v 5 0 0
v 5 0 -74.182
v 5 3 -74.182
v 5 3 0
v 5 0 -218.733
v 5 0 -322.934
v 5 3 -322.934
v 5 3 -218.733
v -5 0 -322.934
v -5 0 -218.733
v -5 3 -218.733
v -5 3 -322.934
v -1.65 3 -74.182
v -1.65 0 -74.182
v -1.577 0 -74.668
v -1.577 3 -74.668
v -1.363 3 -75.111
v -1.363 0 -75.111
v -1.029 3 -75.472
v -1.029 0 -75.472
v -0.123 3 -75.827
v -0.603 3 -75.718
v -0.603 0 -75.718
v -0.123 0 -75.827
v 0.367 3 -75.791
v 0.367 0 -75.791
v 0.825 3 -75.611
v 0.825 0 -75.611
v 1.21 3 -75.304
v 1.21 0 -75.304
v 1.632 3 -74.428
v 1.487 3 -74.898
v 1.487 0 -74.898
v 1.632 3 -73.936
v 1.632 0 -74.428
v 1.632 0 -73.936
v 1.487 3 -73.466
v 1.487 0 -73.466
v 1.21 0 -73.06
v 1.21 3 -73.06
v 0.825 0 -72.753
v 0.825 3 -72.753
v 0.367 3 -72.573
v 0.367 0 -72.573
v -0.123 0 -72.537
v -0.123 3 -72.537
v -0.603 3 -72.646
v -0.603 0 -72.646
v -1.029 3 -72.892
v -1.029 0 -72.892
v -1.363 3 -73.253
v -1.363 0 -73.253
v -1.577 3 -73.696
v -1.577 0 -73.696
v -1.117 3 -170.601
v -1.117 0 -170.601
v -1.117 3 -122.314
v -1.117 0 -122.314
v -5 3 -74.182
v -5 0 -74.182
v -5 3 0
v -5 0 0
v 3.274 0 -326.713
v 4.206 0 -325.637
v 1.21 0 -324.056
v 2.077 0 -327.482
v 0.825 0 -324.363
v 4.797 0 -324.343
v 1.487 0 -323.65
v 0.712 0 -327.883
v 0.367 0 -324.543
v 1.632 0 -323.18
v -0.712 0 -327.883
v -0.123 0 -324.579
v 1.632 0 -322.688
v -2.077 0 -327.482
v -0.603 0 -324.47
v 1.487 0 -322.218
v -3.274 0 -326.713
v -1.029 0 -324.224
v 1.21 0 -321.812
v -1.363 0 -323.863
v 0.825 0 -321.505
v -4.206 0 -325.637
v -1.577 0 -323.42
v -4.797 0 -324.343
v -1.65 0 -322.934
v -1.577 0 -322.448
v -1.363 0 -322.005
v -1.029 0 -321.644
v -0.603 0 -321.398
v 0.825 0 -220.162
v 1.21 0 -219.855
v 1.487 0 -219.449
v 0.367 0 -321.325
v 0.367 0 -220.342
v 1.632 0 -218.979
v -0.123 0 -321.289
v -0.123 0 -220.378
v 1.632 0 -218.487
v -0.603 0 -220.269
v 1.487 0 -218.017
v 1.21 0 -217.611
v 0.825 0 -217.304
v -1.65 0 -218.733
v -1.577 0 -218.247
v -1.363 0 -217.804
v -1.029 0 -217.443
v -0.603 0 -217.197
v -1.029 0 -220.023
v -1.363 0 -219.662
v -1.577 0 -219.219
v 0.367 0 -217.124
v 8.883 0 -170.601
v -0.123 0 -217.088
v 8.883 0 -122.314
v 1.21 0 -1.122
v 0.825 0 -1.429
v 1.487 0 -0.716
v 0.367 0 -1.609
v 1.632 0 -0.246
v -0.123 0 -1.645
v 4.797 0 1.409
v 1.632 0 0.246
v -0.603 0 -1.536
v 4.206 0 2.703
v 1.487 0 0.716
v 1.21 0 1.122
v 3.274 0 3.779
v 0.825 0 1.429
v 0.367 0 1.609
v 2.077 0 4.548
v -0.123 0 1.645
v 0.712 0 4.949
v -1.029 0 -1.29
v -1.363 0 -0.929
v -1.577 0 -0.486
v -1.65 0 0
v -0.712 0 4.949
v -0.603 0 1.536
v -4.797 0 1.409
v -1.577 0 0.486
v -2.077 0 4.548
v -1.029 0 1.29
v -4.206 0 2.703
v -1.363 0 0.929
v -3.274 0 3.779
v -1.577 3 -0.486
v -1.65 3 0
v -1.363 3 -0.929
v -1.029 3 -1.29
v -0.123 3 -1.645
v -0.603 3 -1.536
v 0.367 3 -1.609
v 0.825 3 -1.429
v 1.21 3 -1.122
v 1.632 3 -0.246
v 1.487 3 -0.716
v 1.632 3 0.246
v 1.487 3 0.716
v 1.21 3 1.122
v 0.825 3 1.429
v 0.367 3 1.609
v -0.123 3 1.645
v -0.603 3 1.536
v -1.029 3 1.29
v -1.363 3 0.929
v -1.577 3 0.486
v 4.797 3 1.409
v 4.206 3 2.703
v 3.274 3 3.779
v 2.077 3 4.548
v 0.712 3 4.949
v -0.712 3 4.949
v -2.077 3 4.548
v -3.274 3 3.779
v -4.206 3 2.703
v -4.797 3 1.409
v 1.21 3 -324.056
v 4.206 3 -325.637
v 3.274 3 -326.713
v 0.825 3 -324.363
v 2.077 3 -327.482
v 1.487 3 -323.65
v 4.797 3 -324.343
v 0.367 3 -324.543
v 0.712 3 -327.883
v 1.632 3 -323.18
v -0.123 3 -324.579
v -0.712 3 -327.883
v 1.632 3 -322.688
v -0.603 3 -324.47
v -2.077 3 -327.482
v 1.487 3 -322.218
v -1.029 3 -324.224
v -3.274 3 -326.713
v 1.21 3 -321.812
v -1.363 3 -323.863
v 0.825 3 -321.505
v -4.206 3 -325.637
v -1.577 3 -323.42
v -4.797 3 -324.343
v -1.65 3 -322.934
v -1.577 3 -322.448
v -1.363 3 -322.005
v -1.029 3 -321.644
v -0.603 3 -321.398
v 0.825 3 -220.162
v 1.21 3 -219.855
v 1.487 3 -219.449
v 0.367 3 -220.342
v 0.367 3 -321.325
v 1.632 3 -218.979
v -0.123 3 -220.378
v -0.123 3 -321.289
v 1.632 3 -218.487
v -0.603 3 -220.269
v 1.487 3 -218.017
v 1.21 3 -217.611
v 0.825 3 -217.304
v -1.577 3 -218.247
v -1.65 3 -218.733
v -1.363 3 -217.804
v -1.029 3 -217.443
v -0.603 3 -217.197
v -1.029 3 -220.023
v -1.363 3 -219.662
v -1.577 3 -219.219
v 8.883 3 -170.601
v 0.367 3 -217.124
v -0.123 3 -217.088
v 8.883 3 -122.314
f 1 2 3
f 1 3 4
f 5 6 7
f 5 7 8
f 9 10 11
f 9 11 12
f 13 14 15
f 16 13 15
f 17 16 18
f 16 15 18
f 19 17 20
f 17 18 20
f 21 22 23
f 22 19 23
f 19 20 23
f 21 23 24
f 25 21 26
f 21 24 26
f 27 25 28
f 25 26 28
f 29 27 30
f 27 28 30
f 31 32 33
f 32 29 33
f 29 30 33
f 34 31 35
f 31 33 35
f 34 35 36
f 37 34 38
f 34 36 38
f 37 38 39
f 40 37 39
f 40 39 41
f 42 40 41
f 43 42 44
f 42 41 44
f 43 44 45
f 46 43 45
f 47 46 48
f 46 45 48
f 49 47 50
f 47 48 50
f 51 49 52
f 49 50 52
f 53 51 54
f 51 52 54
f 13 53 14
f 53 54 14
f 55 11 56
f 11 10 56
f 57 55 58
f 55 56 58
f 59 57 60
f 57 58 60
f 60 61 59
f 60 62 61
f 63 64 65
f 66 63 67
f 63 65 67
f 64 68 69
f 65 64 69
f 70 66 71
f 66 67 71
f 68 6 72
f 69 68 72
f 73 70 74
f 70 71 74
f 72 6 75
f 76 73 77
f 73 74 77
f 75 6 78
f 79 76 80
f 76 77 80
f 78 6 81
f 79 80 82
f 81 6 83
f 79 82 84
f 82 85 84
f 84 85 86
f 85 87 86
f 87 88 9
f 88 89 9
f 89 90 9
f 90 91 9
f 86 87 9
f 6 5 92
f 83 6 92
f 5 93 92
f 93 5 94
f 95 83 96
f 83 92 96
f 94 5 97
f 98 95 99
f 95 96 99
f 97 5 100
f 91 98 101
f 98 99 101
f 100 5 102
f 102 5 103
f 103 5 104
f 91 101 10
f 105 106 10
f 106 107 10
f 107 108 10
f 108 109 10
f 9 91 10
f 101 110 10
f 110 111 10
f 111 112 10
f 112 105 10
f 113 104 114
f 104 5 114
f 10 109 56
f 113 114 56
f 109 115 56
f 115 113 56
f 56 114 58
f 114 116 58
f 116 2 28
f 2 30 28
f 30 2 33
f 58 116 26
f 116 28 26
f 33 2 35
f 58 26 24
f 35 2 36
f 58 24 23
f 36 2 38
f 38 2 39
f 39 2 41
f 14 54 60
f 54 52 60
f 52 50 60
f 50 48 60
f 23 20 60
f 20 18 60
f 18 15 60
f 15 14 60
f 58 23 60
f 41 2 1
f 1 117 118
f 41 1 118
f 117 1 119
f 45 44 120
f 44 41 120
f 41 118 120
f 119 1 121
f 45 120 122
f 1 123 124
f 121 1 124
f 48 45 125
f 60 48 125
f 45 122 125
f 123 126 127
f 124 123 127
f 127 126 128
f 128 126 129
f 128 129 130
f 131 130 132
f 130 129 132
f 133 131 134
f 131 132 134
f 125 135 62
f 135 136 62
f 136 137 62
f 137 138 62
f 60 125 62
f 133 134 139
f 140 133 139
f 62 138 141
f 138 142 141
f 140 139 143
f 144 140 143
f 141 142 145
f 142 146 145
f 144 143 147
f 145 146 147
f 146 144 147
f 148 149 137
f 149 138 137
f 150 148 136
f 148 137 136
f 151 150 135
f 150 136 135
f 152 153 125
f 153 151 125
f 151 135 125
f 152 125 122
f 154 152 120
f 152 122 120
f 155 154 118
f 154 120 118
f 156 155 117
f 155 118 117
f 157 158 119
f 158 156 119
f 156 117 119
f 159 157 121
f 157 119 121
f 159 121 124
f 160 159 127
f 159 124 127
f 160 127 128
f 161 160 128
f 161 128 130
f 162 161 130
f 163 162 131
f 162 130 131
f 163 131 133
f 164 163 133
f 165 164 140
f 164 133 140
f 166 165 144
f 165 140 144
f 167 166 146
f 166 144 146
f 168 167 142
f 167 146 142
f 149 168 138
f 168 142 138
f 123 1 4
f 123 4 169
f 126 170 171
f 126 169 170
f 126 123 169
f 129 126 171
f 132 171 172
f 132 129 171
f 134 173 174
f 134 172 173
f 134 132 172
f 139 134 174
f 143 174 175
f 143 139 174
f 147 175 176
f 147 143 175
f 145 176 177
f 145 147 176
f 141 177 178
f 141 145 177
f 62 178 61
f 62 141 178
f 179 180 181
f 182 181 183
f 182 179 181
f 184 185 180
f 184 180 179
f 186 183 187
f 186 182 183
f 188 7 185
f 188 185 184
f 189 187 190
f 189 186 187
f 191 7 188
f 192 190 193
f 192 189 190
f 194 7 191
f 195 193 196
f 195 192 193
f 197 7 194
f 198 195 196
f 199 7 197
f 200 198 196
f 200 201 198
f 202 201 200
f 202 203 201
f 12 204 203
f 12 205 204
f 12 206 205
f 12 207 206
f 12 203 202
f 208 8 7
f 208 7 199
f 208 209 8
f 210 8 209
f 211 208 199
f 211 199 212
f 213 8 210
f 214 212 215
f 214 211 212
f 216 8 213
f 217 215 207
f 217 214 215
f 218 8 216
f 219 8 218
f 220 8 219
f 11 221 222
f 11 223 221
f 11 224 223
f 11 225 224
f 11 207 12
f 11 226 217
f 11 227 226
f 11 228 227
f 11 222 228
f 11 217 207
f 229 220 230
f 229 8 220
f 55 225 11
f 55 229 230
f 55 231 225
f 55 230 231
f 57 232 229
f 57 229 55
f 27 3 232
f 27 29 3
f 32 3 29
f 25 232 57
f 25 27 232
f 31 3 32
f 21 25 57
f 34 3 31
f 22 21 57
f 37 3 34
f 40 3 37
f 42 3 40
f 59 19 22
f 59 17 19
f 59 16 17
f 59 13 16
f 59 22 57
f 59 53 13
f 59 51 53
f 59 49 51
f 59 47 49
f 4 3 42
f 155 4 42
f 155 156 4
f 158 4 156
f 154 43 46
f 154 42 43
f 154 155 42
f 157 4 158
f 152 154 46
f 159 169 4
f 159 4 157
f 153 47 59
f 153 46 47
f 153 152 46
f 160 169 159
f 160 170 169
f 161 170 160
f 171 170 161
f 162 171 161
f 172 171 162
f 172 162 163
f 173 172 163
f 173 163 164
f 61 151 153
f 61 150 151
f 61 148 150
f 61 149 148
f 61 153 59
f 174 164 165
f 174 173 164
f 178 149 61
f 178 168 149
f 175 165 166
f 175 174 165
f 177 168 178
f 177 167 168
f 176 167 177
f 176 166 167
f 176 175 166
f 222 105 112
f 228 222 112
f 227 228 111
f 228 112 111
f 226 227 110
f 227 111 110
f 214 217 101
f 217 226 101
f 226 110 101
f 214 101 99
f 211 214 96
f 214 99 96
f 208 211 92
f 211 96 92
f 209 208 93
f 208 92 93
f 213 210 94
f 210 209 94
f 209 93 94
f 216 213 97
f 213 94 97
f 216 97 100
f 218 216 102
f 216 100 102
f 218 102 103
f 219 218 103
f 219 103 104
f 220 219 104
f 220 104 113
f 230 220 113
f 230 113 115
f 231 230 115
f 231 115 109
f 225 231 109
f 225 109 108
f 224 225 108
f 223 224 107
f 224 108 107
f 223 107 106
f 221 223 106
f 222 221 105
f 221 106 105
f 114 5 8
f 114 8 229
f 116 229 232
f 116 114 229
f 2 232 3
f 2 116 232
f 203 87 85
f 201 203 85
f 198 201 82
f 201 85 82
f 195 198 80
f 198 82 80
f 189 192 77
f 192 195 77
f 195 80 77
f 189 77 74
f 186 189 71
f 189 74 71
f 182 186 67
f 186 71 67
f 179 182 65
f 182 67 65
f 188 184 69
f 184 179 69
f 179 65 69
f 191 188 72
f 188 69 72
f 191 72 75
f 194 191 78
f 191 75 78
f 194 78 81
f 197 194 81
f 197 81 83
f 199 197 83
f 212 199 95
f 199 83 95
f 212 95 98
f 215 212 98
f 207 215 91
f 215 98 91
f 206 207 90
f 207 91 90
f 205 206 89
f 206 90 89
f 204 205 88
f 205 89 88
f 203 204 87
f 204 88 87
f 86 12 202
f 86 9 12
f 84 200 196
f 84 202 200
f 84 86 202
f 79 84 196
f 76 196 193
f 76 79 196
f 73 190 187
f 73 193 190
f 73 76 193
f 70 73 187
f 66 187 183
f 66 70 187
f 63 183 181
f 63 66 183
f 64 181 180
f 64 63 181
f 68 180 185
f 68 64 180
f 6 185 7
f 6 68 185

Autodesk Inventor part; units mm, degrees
ref_plane "YZ Plane" through (0, 0, 0) normal (1, 0, 0) x (0, 1, 0)
ref_plane "XZ Plane" through (0, 0, 0) normal (0, 1, 0) x (-1, 0, 0)
ref_plane "XY Plane" through (0, 0, 0) normal (0, 0, 1) x (1, 0, 0)
sketch "Sketch1" plane through (0, 0, 0) normal (0, 1, 0) x (-1, 0, 0)
  line L0 (0, 0) -> (0, -322.934) construction
  line L1 (5, 0) -> (5, -322.934)
  line L2 (-5, -322.934) -> (-5, 0)
  arc A0 (5, 0) -> (-5, 0) centre (0, 0) ccw
  arc A1 (-5, -322.934) -> (5, -322.934) centre (0, -322.934) ccw
  circle A2 centre (0, 0) radius 1.65
  circle A3 centre (0, -322.934) radius 1.65
  circle A4 centre (0, -74.182) radius 1.65
  circle A5 centre (0, -218.733) radius 1.65
  arc A6 (5, -74.182) -> (5, -218.733) centre (600.631, -146.4575) ccw
  arc A7 (-5, -74.182) -> (-5, -218.733) centre (590.631, -146.4575) ccw
  point P0 (0, -161.467)
  dimension "d0" = 3.3
  dimension "d1" = 3.3
  dimension "d2" = 10
  dimension "d3" = 322.934
  dimension "d4" = 3.3
  dimension "d5" = 74.182
  dimension "d8" = 3.3
  dimension "d9" = 218.733
  dimension "d12" = 600
  dimension "d13" = 600
extrude "Extrusion1" add sketch "Sketch1" along normal blind 3 contours L1 A6 A1 L2 A0 | L2 A7
